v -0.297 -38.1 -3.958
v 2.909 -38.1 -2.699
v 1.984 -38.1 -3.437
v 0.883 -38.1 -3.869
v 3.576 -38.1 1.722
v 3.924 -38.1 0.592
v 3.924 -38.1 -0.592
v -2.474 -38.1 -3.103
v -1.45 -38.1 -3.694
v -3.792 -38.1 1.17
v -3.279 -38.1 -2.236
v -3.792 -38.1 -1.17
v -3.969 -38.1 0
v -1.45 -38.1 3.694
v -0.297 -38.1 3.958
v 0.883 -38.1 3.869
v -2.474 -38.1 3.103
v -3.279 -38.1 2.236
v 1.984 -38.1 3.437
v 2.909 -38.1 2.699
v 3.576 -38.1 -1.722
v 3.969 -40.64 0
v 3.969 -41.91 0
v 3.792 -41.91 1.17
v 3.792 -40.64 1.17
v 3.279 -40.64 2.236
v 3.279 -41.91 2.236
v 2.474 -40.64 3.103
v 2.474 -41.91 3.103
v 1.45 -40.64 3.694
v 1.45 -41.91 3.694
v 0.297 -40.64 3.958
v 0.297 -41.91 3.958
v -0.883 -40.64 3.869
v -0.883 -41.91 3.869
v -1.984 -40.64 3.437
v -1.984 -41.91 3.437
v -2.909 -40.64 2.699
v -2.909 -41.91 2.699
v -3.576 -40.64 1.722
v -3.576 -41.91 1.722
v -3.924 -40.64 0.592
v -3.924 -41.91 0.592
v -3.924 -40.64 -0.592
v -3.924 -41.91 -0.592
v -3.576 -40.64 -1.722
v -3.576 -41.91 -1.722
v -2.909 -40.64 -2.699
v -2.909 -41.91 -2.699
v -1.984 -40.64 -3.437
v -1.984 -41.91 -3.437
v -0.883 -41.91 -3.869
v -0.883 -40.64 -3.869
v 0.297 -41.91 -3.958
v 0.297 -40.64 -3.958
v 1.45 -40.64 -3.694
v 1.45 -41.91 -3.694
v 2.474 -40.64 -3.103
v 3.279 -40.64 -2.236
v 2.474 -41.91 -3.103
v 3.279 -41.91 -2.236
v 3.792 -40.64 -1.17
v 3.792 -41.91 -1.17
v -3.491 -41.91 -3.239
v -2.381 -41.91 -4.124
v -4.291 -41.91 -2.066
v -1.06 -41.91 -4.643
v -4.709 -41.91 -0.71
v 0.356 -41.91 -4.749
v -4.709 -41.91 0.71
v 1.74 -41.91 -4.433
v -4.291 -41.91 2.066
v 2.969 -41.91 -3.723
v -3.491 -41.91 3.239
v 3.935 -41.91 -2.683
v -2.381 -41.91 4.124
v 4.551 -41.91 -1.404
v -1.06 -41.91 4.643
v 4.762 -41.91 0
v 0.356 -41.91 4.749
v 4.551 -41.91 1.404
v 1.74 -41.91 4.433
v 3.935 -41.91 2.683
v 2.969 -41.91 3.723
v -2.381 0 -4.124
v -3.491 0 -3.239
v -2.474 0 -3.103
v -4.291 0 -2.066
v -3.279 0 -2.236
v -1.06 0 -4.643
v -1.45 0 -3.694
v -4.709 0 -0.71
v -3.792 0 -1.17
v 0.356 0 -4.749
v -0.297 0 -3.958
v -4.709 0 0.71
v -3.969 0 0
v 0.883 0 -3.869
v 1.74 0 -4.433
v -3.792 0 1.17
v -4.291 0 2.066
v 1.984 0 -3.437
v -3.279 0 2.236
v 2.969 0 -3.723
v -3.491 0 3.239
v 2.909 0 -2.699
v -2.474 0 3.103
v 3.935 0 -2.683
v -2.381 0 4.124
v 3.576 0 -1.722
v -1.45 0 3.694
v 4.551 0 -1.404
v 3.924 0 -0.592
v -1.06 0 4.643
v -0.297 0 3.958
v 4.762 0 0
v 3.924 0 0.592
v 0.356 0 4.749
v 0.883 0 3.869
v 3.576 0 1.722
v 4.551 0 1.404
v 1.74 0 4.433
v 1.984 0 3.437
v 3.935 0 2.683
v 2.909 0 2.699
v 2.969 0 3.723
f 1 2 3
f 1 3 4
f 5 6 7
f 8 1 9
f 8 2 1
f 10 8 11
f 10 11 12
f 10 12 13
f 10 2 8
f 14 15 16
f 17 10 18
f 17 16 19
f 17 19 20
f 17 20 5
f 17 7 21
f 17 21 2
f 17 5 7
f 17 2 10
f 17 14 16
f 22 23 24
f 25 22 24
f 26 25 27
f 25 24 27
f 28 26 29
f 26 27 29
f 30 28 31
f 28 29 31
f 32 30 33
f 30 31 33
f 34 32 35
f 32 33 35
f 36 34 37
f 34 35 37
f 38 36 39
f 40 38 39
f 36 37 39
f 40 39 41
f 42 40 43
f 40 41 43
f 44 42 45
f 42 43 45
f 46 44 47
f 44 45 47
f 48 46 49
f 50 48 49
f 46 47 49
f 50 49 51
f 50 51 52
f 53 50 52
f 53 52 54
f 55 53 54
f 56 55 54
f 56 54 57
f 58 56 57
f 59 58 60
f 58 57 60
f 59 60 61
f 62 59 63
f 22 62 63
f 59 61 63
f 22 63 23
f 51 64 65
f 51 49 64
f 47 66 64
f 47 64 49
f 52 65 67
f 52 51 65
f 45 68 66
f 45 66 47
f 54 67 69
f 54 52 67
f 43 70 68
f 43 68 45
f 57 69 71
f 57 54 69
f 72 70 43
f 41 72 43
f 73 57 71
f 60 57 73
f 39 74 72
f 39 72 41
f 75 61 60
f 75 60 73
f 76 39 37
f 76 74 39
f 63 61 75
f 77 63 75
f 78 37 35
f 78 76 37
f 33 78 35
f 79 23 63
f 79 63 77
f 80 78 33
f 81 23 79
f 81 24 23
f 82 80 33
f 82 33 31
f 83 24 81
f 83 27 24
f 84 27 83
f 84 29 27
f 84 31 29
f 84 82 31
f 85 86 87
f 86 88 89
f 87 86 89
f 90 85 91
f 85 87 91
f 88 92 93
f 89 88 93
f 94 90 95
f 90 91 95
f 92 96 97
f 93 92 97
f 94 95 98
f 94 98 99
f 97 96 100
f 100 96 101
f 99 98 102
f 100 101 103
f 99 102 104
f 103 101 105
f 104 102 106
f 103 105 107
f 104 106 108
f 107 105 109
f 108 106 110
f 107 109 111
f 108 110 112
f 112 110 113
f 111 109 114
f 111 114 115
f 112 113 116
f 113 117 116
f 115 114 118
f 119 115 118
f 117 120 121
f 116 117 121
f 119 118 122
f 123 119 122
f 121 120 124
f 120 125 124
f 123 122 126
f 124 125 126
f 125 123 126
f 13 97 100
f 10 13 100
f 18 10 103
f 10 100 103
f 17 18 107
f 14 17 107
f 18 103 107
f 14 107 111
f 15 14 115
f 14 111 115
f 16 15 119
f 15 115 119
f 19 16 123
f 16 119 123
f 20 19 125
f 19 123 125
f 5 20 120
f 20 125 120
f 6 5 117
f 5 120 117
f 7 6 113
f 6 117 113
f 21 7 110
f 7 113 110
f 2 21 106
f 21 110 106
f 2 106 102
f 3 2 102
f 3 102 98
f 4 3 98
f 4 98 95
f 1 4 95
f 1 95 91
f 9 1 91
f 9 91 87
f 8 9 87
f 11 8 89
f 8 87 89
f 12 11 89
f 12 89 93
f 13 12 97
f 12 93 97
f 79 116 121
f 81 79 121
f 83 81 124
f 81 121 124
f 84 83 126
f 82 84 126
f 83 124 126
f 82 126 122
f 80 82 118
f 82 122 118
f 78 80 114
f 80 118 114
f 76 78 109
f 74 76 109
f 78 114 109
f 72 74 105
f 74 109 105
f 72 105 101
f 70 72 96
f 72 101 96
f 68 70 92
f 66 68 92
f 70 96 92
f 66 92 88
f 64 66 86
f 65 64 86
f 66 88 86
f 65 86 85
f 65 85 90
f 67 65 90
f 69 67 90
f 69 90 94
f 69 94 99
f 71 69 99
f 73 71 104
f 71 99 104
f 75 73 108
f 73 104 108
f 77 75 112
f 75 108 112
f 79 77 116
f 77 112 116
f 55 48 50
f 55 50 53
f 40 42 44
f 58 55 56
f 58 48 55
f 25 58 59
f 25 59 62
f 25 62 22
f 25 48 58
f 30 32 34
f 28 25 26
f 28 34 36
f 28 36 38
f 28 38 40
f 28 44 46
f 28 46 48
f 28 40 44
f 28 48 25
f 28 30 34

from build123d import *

# Parameters (mm, degrees)
F0_R     = 4.7625
F1_DEPTH = 41.91
F2_R     = 3.96875
F3_DEPTH = 38.1
F4_R     = 3.96875
F5_DEPTH = 1.27


with BuildPart() as f1:
    # F0 (on Front) → F1 (new body)
    with BuildSketch(Plane.XZ):
        Circle(F0_R)
    extrude(amount=F1_DEPTH)

    # F2 (on face) → F3 (cut)
    with BuildSketch(Plane(origin=(0, 0, 0), x_dir=(-1, 0, 0), z_dir=(0, 1, 0))):
        Circle(F2_R)
    extrude(amount=-F3_DEPTH, mode=Mode.SUBTRACT)

    # F4 (on face) → F5 (cut)
    with BuildSketch(Plane.XZ.offset(41.91)):
        Circle(F4_R)
    extrude(amount=-F5_DEPTH, mode=Mode.SUBTRACT)


solid = f1.part
